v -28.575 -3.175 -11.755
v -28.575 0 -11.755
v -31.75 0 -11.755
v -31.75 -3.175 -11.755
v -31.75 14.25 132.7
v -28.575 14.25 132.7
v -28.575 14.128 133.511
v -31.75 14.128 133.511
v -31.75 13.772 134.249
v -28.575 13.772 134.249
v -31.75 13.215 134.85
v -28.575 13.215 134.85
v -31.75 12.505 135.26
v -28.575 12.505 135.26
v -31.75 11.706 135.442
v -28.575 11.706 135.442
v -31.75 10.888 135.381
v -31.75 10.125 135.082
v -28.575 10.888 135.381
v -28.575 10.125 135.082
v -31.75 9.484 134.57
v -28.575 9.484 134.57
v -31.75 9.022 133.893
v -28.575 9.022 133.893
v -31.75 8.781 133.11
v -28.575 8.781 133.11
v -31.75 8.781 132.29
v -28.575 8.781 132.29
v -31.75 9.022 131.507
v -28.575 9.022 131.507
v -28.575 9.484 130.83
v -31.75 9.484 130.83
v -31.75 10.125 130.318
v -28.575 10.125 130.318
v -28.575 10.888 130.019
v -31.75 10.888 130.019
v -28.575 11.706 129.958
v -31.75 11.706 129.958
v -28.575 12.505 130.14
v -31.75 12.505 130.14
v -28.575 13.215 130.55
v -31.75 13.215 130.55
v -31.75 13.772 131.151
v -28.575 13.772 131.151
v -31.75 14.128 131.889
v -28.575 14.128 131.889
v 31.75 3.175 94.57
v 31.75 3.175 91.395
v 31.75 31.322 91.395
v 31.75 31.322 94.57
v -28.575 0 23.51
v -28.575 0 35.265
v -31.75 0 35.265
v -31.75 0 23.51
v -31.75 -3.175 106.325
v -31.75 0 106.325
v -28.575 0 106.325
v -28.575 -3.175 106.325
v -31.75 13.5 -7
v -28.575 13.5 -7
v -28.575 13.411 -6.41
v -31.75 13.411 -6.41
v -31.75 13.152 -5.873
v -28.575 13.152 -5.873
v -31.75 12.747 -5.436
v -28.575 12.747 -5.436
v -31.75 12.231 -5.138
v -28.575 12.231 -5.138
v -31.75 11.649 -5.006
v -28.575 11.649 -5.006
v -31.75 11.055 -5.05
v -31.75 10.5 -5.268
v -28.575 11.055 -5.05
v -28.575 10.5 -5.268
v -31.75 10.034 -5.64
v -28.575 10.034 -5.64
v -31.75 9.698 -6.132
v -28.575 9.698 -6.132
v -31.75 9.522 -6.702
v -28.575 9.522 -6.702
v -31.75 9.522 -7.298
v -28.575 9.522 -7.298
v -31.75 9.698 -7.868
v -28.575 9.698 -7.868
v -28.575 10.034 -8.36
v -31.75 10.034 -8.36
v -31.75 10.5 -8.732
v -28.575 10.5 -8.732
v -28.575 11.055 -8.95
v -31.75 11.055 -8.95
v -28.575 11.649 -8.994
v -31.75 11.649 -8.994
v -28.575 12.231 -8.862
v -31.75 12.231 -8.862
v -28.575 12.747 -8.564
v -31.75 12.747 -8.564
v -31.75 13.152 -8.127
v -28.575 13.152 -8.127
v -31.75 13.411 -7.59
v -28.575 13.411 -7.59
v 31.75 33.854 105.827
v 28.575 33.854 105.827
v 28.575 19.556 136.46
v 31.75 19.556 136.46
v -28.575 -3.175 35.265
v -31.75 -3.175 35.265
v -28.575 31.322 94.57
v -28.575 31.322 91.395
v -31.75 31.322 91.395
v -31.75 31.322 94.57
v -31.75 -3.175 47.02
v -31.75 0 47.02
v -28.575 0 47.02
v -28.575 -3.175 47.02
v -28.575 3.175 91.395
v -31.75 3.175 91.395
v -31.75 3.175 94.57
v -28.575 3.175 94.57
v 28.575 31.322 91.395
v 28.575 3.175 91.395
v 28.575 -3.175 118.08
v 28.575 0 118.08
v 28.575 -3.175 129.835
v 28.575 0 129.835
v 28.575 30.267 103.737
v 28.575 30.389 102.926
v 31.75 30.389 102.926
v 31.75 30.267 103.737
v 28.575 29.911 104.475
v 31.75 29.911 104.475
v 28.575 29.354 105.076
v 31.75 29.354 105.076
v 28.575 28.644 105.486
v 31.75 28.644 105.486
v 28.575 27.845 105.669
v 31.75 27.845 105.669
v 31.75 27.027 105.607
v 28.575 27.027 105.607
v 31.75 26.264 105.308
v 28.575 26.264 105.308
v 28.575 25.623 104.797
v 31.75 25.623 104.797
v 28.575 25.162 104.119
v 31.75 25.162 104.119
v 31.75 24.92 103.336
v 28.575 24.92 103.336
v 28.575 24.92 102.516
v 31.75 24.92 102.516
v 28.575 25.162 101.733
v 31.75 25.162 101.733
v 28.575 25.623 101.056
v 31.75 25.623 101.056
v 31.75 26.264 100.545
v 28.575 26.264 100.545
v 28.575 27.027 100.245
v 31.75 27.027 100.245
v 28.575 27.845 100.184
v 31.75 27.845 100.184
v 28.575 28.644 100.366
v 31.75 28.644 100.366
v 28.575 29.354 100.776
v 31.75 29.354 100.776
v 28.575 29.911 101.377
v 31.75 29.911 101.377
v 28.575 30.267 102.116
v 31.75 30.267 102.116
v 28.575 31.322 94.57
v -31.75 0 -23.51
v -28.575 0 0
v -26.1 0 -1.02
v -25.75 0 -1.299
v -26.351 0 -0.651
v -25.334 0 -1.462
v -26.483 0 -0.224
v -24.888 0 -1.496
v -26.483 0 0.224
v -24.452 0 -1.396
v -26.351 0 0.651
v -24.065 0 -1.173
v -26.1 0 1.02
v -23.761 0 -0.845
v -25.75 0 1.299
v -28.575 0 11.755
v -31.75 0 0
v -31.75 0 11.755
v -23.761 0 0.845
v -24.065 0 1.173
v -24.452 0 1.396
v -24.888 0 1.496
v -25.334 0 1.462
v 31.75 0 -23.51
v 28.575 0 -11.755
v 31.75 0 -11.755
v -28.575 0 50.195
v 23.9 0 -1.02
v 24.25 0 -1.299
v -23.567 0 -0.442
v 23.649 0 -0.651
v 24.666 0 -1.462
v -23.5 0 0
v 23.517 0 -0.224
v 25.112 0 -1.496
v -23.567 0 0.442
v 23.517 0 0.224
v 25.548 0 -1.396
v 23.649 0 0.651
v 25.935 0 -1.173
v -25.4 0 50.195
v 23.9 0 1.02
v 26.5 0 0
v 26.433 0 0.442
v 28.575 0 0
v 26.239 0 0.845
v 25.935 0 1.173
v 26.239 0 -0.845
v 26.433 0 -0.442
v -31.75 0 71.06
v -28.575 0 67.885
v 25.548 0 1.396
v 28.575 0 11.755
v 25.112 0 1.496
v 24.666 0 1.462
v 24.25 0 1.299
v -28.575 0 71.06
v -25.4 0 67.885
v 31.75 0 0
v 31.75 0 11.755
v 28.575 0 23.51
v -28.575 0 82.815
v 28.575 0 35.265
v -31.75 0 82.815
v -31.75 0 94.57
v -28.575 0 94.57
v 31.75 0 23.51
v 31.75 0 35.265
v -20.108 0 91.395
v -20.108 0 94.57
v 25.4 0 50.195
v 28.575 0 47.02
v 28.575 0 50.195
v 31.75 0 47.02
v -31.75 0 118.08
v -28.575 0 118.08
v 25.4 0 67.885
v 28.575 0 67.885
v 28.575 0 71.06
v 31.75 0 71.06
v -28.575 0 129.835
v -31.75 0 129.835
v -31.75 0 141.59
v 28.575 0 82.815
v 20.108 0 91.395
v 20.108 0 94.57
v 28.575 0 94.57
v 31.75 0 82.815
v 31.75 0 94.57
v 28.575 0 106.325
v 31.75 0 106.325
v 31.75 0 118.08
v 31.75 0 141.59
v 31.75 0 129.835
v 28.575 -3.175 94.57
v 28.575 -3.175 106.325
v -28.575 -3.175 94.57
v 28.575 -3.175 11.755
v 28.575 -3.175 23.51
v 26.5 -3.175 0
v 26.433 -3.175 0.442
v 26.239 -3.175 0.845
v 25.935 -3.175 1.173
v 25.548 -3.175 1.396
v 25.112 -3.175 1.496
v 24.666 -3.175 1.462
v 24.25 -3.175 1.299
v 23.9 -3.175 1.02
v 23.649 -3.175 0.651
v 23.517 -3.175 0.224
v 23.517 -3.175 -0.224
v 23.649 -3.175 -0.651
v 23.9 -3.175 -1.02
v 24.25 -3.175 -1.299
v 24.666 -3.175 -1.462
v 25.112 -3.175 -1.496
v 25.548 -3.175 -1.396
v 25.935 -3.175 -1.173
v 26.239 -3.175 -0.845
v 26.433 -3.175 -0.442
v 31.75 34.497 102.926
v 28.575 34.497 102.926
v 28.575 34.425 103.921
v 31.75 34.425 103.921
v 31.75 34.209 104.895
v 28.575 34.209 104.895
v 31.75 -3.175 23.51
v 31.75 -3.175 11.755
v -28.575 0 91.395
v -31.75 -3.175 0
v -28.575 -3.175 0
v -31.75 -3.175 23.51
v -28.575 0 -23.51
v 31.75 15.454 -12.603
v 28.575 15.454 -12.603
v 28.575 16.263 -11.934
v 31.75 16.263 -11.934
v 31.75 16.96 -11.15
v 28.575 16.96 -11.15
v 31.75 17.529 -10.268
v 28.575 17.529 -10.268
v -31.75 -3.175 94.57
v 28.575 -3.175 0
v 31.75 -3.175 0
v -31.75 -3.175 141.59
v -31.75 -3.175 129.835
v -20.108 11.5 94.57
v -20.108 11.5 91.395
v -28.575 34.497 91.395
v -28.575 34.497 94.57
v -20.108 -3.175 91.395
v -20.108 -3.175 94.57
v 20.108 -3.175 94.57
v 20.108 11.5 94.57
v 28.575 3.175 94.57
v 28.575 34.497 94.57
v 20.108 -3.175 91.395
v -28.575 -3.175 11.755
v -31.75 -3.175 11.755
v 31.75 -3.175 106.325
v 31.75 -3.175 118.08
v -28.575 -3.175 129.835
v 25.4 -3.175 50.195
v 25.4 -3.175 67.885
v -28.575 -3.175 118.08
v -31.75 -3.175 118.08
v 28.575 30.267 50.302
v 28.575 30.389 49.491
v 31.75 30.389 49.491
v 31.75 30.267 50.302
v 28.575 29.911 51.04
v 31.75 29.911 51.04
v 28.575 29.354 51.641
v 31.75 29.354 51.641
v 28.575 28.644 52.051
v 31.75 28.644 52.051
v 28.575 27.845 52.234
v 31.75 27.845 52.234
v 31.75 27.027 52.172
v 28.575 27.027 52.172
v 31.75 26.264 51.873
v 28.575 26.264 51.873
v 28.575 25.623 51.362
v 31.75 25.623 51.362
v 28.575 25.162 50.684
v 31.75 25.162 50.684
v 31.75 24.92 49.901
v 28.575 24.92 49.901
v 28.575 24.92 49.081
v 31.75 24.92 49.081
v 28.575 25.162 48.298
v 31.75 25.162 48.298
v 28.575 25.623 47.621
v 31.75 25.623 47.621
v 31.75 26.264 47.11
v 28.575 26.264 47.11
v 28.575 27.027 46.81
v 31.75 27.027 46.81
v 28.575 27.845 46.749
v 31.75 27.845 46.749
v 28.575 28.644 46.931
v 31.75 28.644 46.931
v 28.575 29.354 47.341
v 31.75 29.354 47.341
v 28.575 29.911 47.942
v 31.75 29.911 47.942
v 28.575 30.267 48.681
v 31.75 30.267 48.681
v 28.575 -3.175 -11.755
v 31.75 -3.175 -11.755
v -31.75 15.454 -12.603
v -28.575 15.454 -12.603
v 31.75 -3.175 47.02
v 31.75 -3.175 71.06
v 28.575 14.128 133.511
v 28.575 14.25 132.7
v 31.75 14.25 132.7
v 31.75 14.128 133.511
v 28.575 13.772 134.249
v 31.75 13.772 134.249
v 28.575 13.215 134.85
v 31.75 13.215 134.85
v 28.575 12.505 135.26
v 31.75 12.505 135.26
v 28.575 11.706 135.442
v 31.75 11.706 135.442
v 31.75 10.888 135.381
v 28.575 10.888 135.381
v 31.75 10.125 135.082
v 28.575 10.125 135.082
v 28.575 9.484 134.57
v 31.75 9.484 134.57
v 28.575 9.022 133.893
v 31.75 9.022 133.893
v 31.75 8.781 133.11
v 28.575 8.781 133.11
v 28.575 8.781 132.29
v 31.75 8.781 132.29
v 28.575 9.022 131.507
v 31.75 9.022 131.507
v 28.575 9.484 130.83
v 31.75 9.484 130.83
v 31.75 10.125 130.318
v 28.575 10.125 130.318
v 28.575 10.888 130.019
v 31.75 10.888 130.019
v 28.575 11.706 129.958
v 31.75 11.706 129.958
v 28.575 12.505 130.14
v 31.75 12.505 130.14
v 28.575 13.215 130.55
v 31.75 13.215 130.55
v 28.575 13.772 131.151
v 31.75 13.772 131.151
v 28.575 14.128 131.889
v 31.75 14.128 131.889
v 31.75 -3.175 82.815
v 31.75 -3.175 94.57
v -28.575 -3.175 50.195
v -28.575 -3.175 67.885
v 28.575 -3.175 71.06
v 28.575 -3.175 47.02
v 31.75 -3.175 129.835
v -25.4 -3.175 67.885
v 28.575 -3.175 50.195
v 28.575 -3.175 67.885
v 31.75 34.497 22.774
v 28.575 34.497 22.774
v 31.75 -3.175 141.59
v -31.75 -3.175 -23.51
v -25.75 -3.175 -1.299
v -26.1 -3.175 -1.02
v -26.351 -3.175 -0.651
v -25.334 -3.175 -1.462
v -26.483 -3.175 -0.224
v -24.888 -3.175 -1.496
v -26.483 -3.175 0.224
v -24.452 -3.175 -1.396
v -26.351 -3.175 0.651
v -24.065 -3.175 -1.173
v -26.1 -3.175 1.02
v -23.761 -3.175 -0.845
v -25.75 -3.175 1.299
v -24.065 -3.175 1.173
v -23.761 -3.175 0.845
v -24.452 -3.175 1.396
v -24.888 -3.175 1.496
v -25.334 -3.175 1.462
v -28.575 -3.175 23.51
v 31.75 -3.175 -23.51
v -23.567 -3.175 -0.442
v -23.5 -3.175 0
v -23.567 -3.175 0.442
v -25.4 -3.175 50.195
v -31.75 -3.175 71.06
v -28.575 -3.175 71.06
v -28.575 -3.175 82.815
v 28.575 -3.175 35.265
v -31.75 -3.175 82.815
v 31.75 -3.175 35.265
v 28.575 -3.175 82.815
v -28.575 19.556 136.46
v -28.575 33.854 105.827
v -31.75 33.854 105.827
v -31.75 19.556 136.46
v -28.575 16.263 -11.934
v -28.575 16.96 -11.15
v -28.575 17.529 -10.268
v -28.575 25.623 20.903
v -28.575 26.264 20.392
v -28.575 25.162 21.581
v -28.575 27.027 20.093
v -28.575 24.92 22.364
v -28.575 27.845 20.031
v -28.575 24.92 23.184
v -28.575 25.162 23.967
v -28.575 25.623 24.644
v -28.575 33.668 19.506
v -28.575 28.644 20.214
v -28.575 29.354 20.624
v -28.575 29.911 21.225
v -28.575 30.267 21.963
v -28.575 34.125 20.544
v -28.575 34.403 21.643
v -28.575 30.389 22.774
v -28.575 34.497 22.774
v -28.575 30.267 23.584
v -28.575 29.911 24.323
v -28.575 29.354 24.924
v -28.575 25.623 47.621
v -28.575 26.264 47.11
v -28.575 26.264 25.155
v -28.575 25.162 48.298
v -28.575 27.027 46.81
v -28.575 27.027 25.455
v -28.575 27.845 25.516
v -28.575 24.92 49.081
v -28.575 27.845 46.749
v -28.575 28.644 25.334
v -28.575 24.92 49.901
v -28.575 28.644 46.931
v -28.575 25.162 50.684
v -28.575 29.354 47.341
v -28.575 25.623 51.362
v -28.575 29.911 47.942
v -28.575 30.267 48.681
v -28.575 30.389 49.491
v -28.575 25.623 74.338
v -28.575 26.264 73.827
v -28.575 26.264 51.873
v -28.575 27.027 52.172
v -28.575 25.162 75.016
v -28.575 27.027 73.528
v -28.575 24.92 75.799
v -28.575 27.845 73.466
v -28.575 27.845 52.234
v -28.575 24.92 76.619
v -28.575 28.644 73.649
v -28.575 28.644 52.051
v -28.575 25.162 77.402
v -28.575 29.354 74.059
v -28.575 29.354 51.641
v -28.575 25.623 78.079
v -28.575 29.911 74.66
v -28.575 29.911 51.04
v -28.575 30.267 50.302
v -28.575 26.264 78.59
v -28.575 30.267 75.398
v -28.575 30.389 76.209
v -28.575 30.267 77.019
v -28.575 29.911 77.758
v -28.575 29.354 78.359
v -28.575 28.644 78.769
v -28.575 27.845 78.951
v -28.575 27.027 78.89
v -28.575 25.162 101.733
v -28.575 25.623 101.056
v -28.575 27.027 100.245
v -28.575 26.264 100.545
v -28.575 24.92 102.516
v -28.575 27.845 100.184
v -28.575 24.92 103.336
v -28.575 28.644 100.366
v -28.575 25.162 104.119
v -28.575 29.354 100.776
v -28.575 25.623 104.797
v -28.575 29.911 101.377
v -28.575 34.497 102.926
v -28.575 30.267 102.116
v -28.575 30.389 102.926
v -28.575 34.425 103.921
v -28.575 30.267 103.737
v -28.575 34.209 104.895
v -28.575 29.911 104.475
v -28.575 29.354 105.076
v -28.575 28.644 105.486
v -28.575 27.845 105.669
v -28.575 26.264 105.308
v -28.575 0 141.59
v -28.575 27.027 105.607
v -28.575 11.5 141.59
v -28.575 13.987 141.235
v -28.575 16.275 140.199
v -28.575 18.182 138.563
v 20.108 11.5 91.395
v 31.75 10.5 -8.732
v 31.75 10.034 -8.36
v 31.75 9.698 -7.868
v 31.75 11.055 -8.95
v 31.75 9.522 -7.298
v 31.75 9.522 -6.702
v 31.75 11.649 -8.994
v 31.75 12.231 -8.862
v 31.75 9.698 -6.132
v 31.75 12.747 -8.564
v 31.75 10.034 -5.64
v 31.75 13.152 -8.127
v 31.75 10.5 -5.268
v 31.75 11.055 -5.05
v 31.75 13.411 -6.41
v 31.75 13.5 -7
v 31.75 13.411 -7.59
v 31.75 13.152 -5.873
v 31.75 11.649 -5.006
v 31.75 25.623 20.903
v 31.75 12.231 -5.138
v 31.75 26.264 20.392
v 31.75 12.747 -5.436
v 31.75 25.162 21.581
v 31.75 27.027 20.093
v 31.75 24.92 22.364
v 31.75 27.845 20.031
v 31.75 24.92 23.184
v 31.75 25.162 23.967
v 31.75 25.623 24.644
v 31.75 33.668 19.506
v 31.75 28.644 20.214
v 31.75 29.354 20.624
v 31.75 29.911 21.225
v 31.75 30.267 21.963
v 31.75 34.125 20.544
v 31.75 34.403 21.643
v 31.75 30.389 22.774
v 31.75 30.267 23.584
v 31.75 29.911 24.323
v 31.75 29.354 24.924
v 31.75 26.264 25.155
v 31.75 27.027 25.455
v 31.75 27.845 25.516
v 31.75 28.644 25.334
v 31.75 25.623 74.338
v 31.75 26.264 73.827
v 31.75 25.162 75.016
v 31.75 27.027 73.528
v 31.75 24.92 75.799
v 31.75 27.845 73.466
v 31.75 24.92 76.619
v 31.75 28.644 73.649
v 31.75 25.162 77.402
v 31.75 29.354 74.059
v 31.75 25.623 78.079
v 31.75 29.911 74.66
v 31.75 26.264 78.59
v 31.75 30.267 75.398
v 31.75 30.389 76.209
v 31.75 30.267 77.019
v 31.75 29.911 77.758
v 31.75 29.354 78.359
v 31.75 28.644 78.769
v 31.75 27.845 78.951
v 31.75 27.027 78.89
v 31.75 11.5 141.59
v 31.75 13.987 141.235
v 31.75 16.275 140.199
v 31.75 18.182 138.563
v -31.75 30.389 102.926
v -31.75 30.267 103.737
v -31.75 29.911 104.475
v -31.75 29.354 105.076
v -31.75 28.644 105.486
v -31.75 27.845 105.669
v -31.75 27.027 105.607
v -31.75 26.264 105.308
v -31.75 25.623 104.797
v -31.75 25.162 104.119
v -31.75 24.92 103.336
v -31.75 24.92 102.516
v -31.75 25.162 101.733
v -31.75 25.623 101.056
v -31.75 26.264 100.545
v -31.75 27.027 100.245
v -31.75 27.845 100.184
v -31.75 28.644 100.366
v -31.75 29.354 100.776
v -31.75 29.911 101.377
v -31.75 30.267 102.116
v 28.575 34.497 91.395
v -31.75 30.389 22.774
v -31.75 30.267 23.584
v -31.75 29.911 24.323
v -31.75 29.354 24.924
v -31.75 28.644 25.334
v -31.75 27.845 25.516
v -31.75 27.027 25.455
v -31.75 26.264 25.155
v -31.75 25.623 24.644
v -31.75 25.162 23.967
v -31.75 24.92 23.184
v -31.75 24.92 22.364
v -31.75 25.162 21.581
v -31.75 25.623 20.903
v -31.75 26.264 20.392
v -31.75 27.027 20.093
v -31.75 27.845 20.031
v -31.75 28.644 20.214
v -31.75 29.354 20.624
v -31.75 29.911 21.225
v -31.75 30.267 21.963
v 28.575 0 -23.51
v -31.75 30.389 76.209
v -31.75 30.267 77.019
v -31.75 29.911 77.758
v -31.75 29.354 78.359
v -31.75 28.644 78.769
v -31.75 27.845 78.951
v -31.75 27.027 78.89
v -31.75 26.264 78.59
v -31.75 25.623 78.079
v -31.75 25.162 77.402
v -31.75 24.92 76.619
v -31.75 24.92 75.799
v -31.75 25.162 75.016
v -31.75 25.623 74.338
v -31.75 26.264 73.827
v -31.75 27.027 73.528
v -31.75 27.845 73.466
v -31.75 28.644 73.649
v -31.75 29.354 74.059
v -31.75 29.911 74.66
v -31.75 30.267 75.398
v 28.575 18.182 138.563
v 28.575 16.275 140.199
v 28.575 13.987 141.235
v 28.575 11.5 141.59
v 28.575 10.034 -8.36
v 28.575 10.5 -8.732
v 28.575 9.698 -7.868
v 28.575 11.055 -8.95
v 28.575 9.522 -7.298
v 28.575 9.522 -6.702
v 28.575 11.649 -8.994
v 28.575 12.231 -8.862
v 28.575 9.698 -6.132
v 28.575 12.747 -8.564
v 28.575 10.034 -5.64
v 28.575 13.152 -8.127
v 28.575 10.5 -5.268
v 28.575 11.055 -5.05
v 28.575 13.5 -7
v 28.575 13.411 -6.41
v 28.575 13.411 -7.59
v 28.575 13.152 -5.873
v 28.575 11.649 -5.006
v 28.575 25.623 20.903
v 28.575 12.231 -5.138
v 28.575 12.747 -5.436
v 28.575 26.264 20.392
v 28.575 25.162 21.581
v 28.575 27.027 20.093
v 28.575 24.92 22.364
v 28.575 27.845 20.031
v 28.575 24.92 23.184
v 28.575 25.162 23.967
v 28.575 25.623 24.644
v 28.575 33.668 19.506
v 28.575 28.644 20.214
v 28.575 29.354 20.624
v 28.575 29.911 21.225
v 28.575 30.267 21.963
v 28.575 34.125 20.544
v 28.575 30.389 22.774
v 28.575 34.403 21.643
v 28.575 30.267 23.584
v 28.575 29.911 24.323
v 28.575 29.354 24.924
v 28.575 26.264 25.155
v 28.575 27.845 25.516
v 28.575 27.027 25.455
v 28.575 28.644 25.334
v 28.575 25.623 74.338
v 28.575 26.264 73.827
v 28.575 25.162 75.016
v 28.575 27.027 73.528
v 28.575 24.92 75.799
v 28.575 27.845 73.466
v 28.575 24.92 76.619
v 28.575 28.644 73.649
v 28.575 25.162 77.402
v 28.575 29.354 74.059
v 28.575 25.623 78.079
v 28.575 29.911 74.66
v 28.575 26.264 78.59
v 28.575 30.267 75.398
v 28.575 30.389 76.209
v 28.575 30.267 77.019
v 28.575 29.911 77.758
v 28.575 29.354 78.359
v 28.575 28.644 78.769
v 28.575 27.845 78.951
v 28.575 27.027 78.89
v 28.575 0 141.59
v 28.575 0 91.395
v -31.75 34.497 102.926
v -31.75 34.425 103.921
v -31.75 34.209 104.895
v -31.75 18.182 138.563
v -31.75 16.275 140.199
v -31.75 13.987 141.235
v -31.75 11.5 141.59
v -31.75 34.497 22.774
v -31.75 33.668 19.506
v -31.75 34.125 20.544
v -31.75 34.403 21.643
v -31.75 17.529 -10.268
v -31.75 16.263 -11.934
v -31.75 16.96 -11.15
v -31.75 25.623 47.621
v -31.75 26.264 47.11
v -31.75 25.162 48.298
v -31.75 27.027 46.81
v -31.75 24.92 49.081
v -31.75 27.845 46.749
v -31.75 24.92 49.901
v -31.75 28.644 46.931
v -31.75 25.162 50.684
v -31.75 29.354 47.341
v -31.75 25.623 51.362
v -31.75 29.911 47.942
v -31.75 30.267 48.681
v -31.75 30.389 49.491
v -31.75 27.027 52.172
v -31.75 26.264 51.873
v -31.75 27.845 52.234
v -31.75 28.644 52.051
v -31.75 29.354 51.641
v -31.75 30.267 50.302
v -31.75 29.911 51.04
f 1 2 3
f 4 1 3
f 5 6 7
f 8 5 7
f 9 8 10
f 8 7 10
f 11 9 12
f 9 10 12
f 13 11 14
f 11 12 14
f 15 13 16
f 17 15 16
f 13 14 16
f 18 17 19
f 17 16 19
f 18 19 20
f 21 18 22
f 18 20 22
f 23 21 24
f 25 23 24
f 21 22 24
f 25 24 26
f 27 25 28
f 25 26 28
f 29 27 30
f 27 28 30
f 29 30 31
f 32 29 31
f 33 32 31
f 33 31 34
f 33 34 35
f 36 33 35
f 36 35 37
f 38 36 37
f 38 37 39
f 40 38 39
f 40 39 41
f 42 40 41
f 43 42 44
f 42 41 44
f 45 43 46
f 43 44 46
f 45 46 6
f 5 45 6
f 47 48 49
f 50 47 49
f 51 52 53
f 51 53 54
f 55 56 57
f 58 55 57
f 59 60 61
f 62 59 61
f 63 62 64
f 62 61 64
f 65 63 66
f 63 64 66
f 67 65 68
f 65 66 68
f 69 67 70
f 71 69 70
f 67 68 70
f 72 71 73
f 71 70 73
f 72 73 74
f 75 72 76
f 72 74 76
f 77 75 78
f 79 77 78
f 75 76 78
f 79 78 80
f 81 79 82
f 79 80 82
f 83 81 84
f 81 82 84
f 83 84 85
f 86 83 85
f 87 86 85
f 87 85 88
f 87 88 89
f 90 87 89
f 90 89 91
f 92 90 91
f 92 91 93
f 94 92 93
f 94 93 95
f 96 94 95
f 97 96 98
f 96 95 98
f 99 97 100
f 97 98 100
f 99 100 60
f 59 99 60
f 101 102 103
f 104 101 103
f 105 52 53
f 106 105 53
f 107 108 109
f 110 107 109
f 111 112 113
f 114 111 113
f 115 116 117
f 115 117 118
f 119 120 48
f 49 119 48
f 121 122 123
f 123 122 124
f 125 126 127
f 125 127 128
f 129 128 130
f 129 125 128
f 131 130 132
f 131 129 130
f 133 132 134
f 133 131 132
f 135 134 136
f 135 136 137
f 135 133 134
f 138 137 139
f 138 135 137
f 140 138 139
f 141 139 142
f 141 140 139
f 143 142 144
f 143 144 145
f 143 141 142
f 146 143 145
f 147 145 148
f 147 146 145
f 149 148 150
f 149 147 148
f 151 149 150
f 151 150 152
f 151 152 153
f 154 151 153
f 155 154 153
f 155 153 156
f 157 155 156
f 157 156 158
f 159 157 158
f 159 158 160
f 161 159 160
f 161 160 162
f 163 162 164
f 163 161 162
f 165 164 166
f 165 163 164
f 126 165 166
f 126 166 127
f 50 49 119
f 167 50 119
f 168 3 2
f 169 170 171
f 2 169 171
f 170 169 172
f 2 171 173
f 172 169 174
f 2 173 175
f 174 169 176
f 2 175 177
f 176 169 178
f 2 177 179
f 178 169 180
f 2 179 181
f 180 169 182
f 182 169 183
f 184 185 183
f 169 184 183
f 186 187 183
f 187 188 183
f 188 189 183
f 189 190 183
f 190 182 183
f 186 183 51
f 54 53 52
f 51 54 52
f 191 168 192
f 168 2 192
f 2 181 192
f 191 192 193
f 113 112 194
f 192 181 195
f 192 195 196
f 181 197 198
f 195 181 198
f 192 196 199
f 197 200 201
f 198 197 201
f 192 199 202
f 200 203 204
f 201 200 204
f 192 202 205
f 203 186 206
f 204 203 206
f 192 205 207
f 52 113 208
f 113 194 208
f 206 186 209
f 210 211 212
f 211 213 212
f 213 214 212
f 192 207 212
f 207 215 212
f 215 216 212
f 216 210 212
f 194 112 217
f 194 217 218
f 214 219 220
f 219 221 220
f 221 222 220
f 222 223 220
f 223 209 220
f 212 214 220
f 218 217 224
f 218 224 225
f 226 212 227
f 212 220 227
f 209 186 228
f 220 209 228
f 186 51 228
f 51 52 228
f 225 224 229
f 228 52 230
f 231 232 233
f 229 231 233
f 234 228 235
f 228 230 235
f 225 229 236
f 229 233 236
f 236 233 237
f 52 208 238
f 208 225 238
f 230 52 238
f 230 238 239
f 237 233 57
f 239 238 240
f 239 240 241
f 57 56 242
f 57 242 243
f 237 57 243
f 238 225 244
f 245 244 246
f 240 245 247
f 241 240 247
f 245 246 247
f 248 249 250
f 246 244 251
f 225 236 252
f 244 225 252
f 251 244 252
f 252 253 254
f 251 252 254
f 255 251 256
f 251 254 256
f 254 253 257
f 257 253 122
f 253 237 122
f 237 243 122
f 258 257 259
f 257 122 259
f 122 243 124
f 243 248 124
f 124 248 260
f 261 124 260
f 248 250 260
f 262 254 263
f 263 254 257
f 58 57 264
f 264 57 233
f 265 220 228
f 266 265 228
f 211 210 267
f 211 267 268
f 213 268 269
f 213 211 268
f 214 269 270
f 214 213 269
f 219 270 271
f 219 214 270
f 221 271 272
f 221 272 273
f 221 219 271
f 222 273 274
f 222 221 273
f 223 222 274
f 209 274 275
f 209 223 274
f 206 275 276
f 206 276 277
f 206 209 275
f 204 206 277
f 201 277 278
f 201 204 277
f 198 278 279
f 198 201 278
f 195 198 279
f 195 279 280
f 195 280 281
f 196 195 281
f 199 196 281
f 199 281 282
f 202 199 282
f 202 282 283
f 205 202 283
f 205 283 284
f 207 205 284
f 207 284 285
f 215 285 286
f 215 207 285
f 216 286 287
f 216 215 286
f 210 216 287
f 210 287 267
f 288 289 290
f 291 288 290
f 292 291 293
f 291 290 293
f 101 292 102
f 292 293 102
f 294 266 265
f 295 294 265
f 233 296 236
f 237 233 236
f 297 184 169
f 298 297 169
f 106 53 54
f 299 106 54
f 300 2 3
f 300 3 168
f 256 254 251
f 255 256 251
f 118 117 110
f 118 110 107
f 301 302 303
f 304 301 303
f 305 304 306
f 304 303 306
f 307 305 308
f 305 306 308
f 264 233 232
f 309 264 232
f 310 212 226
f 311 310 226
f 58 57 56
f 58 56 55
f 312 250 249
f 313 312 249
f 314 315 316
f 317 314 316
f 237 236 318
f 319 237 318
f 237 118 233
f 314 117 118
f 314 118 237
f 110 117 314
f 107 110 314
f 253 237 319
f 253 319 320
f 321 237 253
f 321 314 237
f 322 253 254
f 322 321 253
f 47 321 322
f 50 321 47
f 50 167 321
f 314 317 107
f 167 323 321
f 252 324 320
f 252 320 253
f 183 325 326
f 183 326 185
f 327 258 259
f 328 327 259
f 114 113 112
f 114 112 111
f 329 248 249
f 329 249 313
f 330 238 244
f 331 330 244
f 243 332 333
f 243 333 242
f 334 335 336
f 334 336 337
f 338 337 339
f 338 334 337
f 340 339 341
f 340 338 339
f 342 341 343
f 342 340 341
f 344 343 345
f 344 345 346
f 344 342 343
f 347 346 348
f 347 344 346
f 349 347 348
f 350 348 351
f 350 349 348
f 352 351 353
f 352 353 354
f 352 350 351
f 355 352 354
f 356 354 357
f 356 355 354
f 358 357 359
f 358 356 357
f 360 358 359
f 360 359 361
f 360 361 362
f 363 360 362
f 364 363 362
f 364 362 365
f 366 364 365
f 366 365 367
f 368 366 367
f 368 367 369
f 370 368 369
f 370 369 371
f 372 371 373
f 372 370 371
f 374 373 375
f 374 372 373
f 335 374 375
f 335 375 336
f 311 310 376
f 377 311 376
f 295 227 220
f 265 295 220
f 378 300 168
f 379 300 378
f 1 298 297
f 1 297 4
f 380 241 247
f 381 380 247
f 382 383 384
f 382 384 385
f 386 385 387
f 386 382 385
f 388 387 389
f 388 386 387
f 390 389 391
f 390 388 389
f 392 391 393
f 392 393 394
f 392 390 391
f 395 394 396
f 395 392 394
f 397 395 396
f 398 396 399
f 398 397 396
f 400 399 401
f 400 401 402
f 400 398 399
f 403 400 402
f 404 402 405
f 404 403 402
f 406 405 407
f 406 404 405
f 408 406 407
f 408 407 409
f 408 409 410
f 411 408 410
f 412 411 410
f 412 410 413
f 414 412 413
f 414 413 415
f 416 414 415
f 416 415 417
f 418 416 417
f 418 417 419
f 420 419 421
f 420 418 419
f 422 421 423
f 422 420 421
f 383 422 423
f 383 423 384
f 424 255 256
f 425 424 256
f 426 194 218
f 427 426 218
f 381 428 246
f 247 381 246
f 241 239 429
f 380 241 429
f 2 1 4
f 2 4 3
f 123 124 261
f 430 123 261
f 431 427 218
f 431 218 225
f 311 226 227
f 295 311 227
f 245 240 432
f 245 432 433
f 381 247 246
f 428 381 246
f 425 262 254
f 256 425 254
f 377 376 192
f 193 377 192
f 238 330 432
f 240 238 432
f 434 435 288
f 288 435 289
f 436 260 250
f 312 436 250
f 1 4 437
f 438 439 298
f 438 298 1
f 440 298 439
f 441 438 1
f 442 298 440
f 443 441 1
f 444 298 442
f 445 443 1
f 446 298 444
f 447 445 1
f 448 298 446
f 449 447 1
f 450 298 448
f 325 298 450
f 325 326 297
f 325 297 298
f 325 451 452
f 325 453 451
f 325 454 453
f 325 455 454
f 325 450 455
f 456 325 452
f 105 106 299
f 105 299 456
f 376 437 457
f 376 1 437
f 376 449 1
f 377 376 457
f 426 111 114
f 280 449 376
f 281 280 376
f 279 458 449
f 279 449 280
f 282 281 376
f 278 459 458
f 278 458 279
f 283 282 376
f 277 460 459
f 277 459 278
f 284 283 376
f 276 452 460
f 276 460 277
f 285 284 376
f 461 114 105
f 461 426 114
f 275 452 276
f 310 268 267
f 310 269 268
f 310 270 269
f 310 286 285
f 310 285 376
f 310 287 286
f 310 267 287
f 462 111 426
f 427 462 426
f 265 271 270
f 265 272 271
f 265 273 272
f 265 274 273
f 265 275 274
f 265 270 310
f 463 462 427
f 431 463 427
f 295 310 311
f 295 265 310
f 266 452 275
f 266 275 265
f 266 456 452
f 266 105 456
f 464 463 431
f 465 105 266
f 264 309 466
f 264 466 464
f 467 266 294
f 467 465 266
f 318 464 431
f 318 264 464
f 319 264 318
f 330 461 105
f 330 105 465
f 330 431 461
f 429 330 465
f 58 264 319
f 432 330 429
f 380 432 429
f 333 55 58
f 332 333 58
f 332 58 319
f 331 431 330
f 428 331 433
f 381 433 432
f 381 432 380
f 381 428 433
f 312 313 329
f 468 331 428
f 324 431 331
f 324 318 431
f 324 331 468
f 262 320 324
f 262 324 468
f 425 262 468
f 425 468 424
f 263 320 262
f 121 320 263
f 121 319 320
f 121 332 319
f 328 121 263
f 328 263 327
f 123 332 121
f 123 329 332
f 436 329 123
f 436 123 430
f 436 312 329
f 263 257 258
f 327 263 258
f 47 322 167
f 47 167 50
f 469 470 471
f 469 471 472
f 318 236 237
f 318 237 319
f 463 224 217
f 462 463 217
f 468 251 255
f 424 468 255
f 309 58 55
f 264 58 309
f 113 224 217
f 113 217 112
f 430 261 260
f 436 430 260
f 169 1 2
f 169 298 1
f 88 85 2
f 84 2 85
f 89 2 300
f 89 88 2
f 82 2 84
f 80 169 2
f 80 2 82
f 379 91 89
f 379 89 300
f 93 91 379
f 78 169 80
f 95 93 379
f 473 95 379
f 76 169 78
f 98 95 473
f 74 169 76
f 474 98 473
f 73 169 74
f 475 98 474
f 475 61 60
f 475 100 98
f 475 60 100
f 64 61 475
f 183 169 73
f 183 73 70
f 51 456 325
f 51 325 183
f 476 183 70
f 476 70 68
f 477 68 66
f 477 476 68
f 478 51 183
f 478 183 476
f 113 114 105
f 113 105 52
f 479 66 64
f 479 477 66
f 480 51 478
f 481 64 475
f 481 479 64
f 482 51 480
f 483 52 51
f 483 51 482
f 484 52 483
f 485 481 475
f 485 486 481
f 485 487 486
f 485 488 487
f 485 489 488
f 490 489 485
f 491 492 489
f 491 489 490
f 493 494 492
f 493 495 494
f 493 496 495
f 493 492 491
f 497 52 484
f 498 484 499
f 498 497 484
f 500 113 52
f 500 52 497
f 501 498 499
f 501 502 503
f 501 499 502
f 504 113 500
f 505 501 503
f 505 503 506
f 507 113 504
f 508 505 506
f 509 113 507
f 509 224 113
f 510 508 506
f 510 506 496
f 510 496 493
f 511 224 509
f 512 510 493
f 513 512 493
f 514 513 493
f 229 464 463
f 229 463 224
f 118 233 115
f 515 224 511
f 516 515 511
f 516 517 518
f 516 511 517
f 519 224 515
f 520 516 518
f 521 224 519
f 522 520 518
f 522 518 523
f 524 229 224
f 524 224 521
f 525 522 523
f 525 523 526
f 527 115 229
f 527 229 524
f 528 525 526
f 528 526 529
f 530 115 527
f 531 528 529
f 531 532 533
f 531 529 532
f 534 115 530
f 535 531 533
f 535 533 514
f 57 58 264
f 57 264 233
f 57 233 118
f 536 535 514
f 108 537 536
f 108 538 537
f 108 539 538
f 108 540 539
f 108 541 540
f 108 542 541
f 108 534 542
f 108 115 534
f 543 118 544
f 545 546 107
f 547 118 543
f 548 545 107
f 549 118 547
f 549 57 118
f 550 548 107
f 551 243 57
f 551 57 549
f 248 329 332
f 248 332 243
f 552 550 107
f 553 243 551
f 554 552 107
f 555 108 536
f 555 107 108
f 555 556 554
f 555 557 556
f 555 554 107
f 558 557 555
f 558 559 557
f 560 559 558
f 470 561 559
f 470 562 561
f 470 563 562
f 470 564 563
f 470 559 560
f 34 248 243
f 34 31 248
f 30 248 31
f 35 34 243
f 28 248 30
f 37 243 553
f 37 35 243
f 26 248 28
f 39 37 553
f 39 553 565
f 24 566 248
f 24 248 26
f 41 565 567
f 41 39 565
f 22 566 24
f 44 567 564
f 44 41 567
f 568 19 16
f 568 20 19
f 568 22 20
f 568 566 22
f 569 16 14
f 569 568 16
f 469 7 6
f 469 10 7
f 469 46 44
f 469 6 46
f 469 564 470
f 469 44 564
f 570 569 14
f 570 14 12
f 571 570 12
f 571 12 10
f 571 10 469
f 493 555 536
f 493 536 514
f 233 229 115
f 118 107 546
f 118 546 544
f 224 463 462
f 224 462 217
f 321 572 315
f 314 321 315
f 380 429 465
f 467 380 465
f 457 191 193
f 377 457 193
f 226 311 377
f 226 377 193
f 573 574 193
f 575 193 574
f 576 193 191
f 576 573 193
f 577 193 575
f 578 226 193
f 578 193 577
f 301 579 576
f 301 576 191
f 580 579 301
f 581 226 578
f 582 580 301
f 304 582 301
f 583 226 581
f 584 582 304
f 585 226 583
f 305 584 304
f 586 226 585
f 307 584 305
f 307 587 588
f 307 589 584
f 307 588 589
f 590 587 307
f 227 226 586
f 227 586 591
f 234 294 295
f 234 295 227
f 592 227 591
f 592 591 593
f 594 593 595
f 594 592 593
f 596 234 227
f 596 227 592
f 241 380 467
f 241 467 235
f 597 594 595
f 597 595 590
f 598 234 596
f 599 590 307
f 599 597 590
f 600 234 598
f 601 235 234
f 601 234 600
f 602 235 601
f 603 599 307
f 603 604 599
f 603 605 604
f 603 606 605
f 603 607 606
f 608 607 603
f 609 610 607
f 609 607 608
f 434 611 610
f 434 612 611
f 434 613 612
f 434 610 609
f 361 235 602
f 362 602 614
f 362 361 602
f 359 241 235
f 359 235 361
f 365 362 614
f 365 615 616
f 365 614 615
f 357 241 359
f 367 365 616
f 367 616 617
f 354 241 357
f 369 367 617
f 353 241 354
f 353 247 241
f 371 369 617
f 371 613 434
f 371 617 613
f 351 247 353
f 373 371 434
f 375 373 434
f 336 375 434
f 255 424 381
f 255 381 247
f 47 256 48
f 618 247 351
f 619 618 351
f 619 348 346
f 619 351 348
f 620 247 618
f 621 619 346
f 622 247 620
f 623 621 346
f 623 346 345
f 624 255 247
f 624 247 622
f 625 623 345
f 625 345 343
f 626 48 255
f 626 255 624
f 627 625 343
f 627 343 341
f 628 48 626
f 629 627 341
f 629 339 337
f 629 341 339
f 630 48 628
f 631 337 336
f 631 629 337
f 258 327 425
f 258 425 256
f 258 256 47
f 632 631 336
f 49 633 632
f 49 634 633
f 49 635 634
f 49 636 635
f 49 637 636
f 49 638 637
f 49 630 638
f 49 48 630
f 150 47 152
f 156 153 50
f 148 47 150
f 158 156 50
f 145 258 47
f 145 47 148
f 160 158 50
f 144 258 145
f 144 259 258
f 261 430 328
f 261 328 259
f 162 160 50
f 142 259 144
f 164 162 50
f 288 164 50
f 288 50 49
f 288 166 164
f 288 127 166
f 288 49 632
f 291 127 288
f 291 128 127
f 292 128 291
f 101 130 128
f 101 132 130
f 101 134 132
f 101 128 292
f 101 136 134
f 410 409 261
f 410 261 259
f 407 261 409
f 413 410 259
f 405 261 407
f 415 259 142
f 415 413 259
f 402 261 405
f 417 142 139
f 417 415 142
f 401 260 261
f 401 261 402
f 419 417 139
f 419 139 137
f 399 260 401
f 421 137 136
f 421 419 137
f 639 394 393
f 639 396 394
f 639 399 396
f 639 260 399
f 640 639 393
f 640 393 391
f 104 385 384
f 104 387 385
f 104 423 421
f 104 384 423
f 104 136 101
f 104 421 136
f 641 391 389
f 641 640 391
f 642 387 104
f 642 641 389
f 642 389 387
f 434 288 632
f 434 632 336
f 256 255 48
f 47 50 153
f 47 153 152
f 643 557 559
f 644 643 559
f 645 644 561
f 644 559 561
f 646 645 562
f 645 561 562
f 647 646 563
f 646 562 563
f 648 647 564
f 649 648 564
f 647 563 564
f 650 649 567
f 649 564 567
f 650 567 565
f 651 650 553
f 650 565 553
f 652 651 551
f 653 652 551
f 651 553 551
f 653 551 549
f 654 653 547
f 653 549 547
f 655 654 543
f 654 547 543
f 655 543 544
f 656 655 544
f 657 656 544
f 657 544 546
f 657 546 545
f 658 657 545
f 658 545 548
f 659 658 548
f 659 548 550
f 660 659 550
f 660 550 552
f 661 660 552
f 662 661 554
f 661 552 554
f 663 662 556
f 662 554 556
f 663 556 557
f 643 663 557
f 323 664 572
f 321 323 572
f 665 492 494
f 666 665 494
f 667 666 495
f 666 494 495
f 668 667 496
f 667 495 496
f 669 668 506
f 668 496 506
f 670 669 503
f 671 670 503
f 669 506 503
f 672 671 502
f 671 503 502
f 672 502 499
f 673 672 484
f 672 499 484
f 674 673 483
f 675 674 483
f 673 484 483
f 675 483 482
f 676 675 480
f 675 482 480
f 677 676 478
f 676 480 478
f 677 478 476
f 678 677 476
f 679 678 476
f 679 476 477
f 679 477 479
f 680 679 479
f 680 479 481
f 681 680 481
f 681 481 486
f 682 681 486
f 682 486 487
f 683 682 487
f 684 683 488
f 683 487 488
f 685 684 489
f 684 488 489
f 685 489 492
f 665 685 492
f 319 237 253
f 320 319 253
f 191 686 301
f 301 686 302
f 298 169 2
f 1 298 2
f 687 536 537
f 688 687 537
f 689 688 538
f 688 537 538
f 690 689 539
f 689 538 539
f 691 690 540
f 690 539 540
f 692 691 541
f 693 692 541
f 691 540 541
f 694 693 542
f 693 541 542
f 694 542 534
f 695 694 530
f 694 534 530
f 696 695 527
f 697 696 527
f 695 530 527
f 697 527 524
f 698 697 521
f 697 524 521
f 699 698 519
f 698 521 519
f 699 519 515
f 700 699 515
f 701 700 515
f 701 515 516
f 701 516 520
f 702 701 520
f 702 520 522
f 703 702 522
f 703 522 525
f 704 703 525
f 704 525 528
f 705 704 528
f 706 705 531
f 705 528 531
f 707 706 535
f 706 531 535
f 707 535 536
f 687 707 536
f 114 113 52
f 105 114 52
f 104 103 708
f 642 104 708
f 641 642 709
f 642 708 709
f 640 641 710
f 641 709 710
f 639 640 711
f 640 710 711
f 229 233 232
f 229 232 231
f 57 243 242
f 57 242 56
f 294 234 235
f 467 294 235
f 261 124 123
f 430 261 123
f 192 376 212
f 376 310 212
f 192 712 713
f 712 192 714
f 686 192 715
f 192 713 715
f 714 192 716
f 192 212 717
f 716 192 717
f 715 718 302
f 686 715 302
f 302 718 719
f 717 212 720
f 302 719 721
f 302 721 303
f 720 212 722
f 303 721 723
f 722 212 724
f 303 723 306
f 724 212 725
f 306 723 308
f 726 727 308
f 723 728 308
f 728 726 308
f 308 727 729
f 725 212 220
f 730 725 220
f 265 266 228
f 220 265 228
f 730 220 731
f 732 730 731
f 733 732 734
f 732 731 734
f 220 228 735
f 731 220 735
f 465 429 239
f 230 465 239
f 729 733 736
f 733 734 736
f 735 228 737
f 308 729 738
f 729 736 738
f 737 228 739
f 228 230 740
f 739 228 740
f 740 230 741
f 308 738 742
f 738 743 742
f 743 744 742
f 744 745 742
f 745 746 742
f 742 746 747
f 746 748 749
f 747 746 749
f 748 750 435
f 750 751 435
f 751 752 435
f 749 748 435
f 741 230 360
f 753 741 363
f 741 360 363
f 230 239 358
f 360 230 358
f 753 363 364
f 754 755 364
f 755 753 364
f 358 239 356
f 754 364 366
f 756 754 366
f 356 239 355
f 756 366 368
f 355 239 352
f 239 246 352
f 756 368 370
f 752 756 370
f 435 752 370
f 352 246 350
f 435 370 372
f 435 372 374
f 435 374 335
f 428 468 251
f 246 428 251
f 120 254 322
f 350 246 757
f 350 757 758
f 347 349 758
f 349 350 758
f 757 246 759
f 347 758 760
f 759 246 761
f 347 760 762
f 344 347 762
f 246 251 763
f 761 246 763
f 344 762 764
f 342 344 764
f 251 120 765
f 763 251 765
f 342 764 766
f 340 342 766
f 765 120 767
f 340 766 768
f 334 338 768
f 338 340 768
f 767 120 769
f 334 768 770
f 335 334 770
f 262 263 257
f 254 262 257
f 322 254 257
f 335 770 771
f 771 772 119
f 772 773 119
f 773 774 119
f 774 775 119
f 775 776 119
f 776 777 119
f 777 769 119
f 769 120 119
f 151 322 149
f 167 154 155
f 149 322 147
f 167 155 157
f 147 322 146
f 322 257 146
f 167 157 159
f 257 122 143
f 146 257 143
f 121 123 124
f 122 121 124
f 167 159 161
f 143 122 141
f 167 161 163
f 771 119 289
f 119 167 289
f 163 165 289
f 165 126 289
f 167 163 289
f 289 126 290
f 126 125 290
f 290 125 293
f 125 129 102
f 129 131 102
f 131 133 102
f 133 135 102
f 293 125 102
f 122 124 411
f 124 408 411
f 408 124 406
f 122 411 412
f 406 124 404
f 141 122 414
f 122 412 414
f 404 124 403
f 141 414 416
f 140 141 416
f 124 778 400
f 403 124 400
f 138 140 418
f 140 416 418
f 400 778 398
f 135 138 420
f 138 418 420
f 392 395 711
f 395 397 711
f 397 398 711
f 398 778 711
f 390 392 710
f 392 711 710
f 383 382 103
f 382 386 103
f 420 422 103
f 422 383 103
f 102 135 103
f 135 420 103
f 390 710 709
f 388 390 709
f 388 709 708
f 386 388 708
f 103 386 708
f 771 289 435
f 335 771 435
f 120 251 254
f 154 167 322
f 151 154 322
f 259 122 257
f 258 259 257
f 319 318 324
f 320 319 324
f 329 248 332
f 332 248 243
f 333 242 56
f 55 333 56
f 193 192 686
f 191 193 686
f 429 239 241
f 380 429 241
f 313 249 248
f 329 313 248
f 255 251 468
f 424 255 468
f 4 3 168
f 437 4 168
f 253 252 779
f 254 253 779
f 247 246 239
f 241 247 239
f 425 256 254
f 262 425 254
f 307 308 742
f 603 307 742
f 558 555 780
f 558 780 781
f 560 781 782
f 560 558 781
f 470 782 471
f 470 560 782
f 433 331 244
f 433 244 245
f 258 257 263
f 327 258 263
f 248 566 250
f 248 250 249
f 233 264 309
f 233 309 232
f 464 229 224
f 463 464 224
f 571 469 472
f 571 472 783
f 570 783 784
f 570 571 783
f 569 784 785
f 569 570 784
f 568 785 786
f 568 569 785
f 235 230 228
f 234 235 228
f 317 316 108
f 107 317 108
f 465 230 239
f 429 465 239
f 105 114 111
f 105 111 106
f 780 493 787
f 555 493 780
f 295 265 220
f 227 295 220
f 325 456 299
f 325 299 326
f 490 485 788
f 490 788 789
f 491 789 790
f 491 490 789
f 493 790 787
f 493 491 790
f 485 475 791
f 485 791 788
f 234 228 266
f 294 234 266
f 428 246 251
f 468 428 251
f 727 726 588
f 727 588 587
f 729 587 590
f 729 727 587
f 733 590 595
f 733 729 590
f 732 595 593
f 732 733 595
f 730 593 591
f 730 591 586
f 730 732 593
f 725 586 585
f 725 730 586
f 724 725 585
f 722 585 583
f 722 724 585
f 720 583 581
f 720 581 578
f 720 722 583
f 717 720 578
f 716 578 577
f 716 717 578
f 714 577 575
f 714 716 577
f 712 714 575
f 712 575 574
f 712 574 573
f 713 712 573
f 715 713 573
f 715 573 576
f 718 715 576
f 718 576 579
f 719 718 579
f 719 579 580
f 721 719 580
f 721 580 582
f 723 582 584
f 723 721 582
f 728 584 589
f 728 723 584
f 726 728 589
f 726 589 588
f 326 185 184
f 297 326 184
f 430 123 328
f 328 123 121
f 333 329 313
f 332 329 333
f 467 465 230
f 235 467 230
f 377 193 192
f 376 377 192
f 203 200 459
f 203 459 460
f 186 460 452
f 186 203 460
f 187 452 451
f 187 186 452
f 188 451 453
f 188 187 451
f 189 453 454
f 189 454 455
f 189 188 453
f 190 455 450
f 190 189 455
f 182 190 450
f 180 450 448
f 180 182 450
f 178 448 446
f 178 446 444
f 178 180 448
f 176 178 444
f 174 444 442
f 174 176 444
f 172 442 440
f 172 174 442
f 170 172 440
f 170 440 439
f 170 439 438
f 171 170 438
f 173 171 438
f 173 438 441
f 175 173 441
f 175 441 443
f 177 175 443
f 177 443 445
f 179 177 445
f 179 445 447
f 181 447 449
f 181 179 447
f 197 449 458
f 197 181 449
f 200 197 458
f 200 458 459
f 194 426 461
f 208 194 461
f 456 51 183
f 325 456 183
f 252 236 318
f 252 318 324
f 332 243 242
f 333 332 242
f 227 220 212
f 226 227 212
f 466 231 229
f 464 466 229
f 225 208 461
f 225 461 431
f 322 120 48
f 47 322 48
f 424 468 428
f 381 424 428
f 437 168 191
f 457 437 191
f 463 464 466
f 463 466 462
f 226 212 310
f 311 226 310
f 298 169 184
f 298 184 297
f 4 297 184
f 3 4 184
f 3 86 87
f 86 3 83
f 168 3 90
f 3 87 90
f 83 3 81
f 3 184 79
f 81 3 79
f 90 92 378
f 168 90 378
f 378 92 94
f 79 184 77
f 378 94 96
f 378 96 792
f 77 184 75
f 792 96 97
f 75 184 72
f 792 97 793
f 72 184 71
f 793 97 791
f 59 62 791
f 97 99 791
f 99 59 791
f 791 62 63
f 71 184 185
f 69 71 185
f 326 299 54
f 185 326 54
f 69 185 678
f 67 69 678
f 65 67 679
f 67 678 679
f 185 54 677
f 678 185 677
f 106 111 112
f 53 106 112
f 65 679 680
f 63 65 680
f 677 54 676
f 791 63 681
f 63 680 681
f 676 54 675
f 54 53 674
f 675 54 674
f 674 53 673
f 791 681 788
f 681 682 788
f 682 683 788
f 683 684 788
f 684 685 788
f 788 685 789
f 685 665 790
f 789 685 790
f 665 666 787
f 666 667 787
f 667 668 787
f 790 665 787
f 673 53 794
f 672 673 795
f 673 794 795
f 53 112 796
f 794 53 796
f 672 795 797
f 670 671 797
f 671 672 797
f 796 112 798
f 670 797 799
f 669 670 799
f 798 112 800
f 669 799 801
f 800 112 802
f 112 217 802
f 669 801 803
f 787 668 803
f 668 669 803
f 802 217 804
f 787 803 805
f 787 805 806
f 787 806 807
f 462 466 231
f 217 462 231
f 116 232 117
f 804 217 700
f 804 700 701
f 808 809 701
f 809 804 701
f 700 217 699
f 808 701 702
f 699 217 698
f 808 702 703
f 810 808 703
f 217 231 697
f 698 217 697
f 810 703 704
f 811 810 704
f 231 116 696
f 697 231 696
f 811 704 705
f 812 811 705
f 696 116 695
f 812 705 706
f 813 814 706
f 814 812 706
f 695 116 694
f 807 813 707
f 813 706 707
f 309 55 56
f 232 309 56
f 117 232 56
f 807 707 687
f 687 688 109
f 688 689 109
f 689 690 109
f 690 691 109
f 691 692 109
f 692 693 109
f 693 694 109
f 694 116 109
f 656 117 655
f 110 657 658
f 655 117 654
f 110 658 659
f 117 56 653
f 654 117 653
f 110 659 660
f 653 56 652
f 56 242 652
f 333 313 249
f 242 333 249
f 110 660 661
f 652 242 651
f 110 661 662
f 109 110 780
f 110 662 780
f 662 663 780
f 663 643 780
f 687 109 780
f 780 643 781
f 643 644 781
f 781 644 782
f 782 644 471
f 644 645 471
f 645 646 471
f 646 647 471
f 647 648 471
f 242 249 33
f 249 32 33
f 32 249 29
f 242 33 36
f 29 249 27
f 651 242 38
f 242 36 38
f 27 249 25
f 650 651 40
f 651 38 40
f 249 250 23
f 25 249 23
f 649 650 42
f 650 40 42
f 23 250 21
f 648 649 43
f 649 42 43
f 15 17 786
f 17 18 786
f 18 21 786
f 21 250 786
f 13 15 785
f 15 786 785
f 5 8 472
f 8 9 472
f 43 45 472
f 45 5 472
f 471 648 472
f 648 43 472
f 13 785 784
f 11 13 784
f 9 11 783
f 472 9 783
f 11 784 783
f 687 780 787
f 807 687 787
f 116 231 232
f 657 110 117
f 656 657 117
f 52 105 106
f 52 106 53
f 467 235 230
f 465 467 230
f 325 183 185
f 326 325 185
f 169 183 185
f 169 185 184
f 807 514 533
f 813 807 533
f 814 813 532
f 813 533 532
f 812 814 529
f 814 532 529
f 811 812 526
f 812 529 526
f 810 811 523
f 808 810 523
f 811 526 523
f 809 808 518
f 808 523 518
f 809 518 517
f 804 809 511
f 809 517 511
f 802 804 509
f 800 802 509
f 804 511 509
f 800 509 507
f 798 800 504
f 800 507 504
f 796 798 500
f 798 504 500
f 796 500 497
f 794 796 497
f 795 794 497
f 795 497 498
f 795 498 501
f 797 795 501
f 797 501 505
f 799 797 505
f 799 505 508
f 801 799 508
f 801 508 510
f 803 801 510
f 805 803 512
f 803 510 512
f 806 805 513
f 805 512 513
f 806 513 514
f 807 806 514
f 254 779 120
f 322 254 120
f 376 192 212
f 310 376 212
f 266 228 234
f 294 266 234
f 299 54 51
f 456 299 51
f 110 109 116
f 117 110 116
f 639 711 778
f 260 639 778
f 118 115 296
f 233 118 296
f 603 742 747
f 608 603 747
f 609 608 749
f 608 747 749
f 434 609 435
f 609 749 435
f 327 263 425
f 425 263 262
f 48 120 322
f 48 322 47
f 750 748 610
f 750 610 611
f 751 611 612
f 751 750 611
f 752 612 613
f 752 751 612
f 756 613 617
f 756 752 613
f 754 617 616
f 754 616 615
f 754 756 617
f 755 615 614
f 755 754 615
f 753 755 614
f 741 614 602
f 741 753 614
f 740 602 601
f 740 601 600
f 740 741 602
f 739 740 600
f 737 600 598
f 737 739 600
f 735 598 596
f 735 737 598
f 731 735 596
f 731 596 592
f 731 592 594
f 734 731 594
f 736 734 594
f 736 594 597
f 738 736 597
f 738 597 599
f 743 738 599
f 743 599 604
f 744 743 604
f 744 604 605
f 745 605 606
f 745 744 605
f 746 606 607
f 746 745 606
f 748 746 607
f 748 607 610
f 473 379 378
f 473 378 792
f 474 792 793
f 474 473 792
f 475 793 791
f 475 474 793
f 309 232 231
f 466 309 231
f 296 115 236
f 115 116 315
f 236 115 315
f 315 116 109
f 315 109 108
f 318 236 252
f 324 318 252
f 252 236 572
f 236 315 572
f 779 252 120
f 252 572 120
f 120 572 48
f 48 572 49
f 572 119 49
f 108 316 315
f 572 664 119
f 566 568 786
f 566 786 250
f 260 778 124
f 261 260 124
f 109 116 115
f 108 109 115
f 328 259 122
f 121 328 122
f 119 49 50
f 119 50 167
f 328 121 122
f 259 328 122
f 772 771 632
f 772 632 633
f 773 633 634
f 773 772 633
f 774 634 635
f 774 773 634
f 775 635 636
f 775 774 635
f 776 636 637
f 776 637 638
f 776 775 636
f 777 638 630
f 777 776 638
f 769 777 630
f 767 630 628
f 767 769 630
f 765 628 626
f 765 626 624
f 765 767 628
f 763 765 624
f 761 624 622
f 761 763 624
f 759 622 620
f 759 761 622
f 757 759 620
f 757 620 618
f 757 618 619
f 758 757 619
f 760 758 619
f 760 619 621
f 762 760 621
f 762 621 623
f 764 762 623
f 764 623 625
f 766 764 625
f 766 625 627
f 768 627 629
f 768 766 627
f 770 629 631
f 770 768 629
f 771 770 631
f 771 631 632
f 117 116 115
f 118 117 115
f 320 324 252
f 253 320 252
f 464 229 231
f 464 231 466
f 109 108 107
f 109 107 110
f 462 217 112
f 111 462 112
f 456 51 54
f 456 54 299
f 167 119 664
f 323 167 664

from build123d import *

# Parameters (mm, degrees)
F3_R      = 1.5
F3_W      = 3.175
F3_H      = 17.69
F4_DEPTH  = 3.175
F6_START  = 28.575
F5_R      = 2
F5_R_2    = 2.75
F6_DEPTH  = 3.175
F9_START  = 91.395
F9_DEPTH  = 3.175
F10_START = 91.395
F10_DEPTH = 3.175


# Not quite as in the source:
# - a variable given as a bare number and used for a length is read in inches; the dataset says mm whatever the document's units were


with BuildPart() as f4:
    # F3 (on Front) → F4 (new body)
    with BuildSketch(Plane.XZ):
        Polygon((-31.75, -23.51), (0, -23.51), (31.75, -23.51), (31.75, -11.755), (28.575, -11.755), (28.575, 0), (31.75, 0), (31.75, 11.755), (28.575, 11.755), (28.575, 23.51), (31.75, 23.51), (31.75, 35.265), (28.575, 35.265), (28.575, 47.02), (31.75, 47.02), (31.75, 59.04), (31.75, 71.06), (28.575, 71.06), (28.575, 82.815), (31.75, 82.815), (31.75, 94.57), (28.575, 94.57), (28.575, 106.325), (31.75, 106.325), (31.75, 118.08), (28.575, 118.08), (28.575, 129.835), (31.75, 129.835), (31.75, 141.59), (0, 141.59), (-31.75, 141.59), (-31.75, 129.835), (-28.575, 129.835), (-28.575, 118.08), (-31.75, 118.08), (-31.75, 106.325), (-28.575, 106.325), (-28.575, 94.57), (-31.75, 94.57), (-31.75, 82.815), (-28.575, 82.815), (-28.575, 71.06), (-31.75, 71.06), (-31.75, 59.04), (-31.75, 47.02), (-28.575, 47.02), (-28.575, 35.265), (-31.75, 35.265), (-31.75, 23.51), (-28.575, 23.51), (-28.575, 11.755), (-31.75, 11.755), (-31.75, 0), (-28.575, 0), (-28.575, -11.755), (-31.75, -11.755), align=None)
        with Locations((-25, 0)):
            Circle(F3_R, mode=Mode.SUBTRACT)
        with Locations((-26.9875, 59.04)):
            Rectangle(F3_W, F3_H, mode=Mode.SUBTRACT)
        with Locations((25, 0)):
            Circle(F3_R, mode=Mode.SUBTRACT)
        with Locations((26.9875, 59.04)):
            Rectangle(F3_W, F3_H, mode=Mode.SUBTRACT)
    extrude(amount=F4_DEPTH)


with BuildPart() as f6:
    # F5 (on Right) → F6 (new body)
    with BuildSketch(Plane.YZ.offset(F6_START)):
        with BuildLine():
            Line((0, -11.755), (0, -23.51))
            Line((0, -23.51), (15.4543846839, -12.6031246436))
            ThreePointArc((15.4543846839, -12.6031246436), (16.6264931323, -11.5553520352), (17.5291906941, -10.2681835282))
            Line((17.5291906941, -10.2681835282), (33.6683686113, 19.5055976772))
            ThreePointArc((33.6683686113, 19.5055976772), (34.286747164, 21.0879617874), (34.4971779172, 22.7737812054))
            Line((34.4971779172, 22.7737812054), (34.4971779172, 102.9262187946))
            ThreePointArc((34.4971779172, 102.9262187946), (34.3343497631, 104.4117617775), (33.8535972949, 105.8267628468))
            Line((33.8535972949, 105.8267628468), (19.5557288229, 136.4599645122))
            ThreePointArc((19.5557288229, 136.4599645122), (16.2752494954, 140.1986060209), (11.5, 141.59))
            Line((11.5, 141.59), (0, 141.59))
            Line((0, 141.59), (0, 129.835))
            Line((0, 129.835), (-3.175, 129.835))
            Line((-3.175, 129.835), (-3.175, 118.08))
            Line((-3.175, 118.08), (0, 118.08))
            Line((0, 118.08), (0, 106.325))
            Line((0, 106.325), (-3.175, 106.325))
            Line((-3.175, 106.325), (-3.175, 94.57))
            Line((-3.175, 94.57), (0, 94.57))
            Line((0, 94.57), (0, 82.815))
            Line((0, 82.815), (-3.175, 82.815))
            Line((-3.175, 82.815), (-3.175, 71.06))
            Line((-3.175, 71.06), (0, 71.06))
            Line((0, 71.06), (0, 59.04))
            Line((0, 59.04), (0, 47.02))
            Line((0, 47.02), (-3.175, 47.02))
            Line((-3.175, 47.02), (-3.175, 35.265))
            Line((-3.175, 35.265), (0, 35.265))
            Line((0, 35.265), (0, 23.51))
            Line((0, 23.51), (-3.175, 23.51))
            Line((-3.175, 23.51), (-3.175, 11.755))
            Line((-3.175, 11.755), (0, 11.755))
            Line((0, 11.755), (0, 0))
            Line((0, 0), (-3.175, 0))
            Line((-3.175, 0), (-3.175, -11.755))
            Line((-3.175, -11.755), (0, -11.755))
        make_face()
        with Locations((11.5, -7)):
            Circle(F5_R, mode=Mode.SUBTRACT)
        with Locations((27.6391779172, 22.7737812054)):
            Circle(F5_R_2, mode=Mode.SUBTRACT)
        with Locations((27.6391779172, 49.4912604018)):
            Circle(F5_R_2, mode=Mode.SUBTRACT)
        with Locations((11.5, 132.7)):
            Circle(F5_R_2, mode=Mode.SUBTRACT)
        with Locations((27.6391779172, 76.2087395982)):
            Circle(F5_R_2, mode=Mode.SUBTRACT)
        with Locations((27.6391779172, 102.9262187946)):
            Circle(F5_R_2, mode=Mode.SUBTRACT)
    extrude(amount=F6_DEPTH)


with BuildPart() as f7_1:
    # F7: instance of F6
    add(f6.part.mirror(Plane.YZ))


with BuildPart() as f9_tool:
    # F8 (on Top) → F9 (new body)
    with BuildSketch(Plane.XY.offset(F9_START)):
        Polygon((20.1083333333, 11.5), (0, 11.5), (-20.1083333333, 11.5), (-28.575, 34.4971779172), (-28.575, 31.3221779172), (-31.75, 31.3221779172), (-31.75, 3.175), (-28.575, 3.175), (-28.575, 0), (-20.1083333333, 0), (-20.1083333333, -3.175), (0, -3.175), (20.1083333333, -3.175), (20.1083333333, 0), (28.575, 0), (28.575, 3.175), (31.75, 3.175), (31.75, 31.3221779172), (28.575, 31.3221779172), (28.575, 34.4971779172), align=None)
    extrude(amount=F9_DEPTH)


with BuildPart() as f4_1:
    add(f4.part)

    # F9: cut by f9_tool
    add(f9_tool.part, mode=Mode.SUBTRACT)


with BuildPart() as f6_1:
    add(f6.part)

    # F9: cut by f9_tool
    add(f9_tool.part, mode=Mode.SUBTRACT)


with BuildPart() as f7_1_1:
    add(f7_1.part)

    # F9: cut by f9_tool
    add(f9_tool.part, mode=Mode.SUBTRACT)


with BuildPart() as f10:
    # F8 (on Top) → F10 (new body)
    with BuildSketch(Plane.XY.offset(F10_START)):
        Polygon((20.1083333333, 11.5), (0, 11.5), (-20.1083333333, 11.5), (-28.575, 34.4971779172), (-28.575, 31.3221779172), (-31.75, 31.3221779172), (-31.75, 3.175), (-28.575, 3.175), (-28.575, 0), (-20.1083333333, 0), (-20.1083333333, -3.175), (0, -3.175), (20.1083333333, -3.175), (20.1083333333, 0), (28.575, 0), (28.575, 3.175), (31.75, 3.175), (31.75, 31.3221779172), (28.575, 31.3221779172), (28.575, 34.4971779172), align=None)
    extrude(amount=F10_DEPTH)


solid = Compound([f4_1.part, f6_1.part, f7_1_1.part, f10.part])
